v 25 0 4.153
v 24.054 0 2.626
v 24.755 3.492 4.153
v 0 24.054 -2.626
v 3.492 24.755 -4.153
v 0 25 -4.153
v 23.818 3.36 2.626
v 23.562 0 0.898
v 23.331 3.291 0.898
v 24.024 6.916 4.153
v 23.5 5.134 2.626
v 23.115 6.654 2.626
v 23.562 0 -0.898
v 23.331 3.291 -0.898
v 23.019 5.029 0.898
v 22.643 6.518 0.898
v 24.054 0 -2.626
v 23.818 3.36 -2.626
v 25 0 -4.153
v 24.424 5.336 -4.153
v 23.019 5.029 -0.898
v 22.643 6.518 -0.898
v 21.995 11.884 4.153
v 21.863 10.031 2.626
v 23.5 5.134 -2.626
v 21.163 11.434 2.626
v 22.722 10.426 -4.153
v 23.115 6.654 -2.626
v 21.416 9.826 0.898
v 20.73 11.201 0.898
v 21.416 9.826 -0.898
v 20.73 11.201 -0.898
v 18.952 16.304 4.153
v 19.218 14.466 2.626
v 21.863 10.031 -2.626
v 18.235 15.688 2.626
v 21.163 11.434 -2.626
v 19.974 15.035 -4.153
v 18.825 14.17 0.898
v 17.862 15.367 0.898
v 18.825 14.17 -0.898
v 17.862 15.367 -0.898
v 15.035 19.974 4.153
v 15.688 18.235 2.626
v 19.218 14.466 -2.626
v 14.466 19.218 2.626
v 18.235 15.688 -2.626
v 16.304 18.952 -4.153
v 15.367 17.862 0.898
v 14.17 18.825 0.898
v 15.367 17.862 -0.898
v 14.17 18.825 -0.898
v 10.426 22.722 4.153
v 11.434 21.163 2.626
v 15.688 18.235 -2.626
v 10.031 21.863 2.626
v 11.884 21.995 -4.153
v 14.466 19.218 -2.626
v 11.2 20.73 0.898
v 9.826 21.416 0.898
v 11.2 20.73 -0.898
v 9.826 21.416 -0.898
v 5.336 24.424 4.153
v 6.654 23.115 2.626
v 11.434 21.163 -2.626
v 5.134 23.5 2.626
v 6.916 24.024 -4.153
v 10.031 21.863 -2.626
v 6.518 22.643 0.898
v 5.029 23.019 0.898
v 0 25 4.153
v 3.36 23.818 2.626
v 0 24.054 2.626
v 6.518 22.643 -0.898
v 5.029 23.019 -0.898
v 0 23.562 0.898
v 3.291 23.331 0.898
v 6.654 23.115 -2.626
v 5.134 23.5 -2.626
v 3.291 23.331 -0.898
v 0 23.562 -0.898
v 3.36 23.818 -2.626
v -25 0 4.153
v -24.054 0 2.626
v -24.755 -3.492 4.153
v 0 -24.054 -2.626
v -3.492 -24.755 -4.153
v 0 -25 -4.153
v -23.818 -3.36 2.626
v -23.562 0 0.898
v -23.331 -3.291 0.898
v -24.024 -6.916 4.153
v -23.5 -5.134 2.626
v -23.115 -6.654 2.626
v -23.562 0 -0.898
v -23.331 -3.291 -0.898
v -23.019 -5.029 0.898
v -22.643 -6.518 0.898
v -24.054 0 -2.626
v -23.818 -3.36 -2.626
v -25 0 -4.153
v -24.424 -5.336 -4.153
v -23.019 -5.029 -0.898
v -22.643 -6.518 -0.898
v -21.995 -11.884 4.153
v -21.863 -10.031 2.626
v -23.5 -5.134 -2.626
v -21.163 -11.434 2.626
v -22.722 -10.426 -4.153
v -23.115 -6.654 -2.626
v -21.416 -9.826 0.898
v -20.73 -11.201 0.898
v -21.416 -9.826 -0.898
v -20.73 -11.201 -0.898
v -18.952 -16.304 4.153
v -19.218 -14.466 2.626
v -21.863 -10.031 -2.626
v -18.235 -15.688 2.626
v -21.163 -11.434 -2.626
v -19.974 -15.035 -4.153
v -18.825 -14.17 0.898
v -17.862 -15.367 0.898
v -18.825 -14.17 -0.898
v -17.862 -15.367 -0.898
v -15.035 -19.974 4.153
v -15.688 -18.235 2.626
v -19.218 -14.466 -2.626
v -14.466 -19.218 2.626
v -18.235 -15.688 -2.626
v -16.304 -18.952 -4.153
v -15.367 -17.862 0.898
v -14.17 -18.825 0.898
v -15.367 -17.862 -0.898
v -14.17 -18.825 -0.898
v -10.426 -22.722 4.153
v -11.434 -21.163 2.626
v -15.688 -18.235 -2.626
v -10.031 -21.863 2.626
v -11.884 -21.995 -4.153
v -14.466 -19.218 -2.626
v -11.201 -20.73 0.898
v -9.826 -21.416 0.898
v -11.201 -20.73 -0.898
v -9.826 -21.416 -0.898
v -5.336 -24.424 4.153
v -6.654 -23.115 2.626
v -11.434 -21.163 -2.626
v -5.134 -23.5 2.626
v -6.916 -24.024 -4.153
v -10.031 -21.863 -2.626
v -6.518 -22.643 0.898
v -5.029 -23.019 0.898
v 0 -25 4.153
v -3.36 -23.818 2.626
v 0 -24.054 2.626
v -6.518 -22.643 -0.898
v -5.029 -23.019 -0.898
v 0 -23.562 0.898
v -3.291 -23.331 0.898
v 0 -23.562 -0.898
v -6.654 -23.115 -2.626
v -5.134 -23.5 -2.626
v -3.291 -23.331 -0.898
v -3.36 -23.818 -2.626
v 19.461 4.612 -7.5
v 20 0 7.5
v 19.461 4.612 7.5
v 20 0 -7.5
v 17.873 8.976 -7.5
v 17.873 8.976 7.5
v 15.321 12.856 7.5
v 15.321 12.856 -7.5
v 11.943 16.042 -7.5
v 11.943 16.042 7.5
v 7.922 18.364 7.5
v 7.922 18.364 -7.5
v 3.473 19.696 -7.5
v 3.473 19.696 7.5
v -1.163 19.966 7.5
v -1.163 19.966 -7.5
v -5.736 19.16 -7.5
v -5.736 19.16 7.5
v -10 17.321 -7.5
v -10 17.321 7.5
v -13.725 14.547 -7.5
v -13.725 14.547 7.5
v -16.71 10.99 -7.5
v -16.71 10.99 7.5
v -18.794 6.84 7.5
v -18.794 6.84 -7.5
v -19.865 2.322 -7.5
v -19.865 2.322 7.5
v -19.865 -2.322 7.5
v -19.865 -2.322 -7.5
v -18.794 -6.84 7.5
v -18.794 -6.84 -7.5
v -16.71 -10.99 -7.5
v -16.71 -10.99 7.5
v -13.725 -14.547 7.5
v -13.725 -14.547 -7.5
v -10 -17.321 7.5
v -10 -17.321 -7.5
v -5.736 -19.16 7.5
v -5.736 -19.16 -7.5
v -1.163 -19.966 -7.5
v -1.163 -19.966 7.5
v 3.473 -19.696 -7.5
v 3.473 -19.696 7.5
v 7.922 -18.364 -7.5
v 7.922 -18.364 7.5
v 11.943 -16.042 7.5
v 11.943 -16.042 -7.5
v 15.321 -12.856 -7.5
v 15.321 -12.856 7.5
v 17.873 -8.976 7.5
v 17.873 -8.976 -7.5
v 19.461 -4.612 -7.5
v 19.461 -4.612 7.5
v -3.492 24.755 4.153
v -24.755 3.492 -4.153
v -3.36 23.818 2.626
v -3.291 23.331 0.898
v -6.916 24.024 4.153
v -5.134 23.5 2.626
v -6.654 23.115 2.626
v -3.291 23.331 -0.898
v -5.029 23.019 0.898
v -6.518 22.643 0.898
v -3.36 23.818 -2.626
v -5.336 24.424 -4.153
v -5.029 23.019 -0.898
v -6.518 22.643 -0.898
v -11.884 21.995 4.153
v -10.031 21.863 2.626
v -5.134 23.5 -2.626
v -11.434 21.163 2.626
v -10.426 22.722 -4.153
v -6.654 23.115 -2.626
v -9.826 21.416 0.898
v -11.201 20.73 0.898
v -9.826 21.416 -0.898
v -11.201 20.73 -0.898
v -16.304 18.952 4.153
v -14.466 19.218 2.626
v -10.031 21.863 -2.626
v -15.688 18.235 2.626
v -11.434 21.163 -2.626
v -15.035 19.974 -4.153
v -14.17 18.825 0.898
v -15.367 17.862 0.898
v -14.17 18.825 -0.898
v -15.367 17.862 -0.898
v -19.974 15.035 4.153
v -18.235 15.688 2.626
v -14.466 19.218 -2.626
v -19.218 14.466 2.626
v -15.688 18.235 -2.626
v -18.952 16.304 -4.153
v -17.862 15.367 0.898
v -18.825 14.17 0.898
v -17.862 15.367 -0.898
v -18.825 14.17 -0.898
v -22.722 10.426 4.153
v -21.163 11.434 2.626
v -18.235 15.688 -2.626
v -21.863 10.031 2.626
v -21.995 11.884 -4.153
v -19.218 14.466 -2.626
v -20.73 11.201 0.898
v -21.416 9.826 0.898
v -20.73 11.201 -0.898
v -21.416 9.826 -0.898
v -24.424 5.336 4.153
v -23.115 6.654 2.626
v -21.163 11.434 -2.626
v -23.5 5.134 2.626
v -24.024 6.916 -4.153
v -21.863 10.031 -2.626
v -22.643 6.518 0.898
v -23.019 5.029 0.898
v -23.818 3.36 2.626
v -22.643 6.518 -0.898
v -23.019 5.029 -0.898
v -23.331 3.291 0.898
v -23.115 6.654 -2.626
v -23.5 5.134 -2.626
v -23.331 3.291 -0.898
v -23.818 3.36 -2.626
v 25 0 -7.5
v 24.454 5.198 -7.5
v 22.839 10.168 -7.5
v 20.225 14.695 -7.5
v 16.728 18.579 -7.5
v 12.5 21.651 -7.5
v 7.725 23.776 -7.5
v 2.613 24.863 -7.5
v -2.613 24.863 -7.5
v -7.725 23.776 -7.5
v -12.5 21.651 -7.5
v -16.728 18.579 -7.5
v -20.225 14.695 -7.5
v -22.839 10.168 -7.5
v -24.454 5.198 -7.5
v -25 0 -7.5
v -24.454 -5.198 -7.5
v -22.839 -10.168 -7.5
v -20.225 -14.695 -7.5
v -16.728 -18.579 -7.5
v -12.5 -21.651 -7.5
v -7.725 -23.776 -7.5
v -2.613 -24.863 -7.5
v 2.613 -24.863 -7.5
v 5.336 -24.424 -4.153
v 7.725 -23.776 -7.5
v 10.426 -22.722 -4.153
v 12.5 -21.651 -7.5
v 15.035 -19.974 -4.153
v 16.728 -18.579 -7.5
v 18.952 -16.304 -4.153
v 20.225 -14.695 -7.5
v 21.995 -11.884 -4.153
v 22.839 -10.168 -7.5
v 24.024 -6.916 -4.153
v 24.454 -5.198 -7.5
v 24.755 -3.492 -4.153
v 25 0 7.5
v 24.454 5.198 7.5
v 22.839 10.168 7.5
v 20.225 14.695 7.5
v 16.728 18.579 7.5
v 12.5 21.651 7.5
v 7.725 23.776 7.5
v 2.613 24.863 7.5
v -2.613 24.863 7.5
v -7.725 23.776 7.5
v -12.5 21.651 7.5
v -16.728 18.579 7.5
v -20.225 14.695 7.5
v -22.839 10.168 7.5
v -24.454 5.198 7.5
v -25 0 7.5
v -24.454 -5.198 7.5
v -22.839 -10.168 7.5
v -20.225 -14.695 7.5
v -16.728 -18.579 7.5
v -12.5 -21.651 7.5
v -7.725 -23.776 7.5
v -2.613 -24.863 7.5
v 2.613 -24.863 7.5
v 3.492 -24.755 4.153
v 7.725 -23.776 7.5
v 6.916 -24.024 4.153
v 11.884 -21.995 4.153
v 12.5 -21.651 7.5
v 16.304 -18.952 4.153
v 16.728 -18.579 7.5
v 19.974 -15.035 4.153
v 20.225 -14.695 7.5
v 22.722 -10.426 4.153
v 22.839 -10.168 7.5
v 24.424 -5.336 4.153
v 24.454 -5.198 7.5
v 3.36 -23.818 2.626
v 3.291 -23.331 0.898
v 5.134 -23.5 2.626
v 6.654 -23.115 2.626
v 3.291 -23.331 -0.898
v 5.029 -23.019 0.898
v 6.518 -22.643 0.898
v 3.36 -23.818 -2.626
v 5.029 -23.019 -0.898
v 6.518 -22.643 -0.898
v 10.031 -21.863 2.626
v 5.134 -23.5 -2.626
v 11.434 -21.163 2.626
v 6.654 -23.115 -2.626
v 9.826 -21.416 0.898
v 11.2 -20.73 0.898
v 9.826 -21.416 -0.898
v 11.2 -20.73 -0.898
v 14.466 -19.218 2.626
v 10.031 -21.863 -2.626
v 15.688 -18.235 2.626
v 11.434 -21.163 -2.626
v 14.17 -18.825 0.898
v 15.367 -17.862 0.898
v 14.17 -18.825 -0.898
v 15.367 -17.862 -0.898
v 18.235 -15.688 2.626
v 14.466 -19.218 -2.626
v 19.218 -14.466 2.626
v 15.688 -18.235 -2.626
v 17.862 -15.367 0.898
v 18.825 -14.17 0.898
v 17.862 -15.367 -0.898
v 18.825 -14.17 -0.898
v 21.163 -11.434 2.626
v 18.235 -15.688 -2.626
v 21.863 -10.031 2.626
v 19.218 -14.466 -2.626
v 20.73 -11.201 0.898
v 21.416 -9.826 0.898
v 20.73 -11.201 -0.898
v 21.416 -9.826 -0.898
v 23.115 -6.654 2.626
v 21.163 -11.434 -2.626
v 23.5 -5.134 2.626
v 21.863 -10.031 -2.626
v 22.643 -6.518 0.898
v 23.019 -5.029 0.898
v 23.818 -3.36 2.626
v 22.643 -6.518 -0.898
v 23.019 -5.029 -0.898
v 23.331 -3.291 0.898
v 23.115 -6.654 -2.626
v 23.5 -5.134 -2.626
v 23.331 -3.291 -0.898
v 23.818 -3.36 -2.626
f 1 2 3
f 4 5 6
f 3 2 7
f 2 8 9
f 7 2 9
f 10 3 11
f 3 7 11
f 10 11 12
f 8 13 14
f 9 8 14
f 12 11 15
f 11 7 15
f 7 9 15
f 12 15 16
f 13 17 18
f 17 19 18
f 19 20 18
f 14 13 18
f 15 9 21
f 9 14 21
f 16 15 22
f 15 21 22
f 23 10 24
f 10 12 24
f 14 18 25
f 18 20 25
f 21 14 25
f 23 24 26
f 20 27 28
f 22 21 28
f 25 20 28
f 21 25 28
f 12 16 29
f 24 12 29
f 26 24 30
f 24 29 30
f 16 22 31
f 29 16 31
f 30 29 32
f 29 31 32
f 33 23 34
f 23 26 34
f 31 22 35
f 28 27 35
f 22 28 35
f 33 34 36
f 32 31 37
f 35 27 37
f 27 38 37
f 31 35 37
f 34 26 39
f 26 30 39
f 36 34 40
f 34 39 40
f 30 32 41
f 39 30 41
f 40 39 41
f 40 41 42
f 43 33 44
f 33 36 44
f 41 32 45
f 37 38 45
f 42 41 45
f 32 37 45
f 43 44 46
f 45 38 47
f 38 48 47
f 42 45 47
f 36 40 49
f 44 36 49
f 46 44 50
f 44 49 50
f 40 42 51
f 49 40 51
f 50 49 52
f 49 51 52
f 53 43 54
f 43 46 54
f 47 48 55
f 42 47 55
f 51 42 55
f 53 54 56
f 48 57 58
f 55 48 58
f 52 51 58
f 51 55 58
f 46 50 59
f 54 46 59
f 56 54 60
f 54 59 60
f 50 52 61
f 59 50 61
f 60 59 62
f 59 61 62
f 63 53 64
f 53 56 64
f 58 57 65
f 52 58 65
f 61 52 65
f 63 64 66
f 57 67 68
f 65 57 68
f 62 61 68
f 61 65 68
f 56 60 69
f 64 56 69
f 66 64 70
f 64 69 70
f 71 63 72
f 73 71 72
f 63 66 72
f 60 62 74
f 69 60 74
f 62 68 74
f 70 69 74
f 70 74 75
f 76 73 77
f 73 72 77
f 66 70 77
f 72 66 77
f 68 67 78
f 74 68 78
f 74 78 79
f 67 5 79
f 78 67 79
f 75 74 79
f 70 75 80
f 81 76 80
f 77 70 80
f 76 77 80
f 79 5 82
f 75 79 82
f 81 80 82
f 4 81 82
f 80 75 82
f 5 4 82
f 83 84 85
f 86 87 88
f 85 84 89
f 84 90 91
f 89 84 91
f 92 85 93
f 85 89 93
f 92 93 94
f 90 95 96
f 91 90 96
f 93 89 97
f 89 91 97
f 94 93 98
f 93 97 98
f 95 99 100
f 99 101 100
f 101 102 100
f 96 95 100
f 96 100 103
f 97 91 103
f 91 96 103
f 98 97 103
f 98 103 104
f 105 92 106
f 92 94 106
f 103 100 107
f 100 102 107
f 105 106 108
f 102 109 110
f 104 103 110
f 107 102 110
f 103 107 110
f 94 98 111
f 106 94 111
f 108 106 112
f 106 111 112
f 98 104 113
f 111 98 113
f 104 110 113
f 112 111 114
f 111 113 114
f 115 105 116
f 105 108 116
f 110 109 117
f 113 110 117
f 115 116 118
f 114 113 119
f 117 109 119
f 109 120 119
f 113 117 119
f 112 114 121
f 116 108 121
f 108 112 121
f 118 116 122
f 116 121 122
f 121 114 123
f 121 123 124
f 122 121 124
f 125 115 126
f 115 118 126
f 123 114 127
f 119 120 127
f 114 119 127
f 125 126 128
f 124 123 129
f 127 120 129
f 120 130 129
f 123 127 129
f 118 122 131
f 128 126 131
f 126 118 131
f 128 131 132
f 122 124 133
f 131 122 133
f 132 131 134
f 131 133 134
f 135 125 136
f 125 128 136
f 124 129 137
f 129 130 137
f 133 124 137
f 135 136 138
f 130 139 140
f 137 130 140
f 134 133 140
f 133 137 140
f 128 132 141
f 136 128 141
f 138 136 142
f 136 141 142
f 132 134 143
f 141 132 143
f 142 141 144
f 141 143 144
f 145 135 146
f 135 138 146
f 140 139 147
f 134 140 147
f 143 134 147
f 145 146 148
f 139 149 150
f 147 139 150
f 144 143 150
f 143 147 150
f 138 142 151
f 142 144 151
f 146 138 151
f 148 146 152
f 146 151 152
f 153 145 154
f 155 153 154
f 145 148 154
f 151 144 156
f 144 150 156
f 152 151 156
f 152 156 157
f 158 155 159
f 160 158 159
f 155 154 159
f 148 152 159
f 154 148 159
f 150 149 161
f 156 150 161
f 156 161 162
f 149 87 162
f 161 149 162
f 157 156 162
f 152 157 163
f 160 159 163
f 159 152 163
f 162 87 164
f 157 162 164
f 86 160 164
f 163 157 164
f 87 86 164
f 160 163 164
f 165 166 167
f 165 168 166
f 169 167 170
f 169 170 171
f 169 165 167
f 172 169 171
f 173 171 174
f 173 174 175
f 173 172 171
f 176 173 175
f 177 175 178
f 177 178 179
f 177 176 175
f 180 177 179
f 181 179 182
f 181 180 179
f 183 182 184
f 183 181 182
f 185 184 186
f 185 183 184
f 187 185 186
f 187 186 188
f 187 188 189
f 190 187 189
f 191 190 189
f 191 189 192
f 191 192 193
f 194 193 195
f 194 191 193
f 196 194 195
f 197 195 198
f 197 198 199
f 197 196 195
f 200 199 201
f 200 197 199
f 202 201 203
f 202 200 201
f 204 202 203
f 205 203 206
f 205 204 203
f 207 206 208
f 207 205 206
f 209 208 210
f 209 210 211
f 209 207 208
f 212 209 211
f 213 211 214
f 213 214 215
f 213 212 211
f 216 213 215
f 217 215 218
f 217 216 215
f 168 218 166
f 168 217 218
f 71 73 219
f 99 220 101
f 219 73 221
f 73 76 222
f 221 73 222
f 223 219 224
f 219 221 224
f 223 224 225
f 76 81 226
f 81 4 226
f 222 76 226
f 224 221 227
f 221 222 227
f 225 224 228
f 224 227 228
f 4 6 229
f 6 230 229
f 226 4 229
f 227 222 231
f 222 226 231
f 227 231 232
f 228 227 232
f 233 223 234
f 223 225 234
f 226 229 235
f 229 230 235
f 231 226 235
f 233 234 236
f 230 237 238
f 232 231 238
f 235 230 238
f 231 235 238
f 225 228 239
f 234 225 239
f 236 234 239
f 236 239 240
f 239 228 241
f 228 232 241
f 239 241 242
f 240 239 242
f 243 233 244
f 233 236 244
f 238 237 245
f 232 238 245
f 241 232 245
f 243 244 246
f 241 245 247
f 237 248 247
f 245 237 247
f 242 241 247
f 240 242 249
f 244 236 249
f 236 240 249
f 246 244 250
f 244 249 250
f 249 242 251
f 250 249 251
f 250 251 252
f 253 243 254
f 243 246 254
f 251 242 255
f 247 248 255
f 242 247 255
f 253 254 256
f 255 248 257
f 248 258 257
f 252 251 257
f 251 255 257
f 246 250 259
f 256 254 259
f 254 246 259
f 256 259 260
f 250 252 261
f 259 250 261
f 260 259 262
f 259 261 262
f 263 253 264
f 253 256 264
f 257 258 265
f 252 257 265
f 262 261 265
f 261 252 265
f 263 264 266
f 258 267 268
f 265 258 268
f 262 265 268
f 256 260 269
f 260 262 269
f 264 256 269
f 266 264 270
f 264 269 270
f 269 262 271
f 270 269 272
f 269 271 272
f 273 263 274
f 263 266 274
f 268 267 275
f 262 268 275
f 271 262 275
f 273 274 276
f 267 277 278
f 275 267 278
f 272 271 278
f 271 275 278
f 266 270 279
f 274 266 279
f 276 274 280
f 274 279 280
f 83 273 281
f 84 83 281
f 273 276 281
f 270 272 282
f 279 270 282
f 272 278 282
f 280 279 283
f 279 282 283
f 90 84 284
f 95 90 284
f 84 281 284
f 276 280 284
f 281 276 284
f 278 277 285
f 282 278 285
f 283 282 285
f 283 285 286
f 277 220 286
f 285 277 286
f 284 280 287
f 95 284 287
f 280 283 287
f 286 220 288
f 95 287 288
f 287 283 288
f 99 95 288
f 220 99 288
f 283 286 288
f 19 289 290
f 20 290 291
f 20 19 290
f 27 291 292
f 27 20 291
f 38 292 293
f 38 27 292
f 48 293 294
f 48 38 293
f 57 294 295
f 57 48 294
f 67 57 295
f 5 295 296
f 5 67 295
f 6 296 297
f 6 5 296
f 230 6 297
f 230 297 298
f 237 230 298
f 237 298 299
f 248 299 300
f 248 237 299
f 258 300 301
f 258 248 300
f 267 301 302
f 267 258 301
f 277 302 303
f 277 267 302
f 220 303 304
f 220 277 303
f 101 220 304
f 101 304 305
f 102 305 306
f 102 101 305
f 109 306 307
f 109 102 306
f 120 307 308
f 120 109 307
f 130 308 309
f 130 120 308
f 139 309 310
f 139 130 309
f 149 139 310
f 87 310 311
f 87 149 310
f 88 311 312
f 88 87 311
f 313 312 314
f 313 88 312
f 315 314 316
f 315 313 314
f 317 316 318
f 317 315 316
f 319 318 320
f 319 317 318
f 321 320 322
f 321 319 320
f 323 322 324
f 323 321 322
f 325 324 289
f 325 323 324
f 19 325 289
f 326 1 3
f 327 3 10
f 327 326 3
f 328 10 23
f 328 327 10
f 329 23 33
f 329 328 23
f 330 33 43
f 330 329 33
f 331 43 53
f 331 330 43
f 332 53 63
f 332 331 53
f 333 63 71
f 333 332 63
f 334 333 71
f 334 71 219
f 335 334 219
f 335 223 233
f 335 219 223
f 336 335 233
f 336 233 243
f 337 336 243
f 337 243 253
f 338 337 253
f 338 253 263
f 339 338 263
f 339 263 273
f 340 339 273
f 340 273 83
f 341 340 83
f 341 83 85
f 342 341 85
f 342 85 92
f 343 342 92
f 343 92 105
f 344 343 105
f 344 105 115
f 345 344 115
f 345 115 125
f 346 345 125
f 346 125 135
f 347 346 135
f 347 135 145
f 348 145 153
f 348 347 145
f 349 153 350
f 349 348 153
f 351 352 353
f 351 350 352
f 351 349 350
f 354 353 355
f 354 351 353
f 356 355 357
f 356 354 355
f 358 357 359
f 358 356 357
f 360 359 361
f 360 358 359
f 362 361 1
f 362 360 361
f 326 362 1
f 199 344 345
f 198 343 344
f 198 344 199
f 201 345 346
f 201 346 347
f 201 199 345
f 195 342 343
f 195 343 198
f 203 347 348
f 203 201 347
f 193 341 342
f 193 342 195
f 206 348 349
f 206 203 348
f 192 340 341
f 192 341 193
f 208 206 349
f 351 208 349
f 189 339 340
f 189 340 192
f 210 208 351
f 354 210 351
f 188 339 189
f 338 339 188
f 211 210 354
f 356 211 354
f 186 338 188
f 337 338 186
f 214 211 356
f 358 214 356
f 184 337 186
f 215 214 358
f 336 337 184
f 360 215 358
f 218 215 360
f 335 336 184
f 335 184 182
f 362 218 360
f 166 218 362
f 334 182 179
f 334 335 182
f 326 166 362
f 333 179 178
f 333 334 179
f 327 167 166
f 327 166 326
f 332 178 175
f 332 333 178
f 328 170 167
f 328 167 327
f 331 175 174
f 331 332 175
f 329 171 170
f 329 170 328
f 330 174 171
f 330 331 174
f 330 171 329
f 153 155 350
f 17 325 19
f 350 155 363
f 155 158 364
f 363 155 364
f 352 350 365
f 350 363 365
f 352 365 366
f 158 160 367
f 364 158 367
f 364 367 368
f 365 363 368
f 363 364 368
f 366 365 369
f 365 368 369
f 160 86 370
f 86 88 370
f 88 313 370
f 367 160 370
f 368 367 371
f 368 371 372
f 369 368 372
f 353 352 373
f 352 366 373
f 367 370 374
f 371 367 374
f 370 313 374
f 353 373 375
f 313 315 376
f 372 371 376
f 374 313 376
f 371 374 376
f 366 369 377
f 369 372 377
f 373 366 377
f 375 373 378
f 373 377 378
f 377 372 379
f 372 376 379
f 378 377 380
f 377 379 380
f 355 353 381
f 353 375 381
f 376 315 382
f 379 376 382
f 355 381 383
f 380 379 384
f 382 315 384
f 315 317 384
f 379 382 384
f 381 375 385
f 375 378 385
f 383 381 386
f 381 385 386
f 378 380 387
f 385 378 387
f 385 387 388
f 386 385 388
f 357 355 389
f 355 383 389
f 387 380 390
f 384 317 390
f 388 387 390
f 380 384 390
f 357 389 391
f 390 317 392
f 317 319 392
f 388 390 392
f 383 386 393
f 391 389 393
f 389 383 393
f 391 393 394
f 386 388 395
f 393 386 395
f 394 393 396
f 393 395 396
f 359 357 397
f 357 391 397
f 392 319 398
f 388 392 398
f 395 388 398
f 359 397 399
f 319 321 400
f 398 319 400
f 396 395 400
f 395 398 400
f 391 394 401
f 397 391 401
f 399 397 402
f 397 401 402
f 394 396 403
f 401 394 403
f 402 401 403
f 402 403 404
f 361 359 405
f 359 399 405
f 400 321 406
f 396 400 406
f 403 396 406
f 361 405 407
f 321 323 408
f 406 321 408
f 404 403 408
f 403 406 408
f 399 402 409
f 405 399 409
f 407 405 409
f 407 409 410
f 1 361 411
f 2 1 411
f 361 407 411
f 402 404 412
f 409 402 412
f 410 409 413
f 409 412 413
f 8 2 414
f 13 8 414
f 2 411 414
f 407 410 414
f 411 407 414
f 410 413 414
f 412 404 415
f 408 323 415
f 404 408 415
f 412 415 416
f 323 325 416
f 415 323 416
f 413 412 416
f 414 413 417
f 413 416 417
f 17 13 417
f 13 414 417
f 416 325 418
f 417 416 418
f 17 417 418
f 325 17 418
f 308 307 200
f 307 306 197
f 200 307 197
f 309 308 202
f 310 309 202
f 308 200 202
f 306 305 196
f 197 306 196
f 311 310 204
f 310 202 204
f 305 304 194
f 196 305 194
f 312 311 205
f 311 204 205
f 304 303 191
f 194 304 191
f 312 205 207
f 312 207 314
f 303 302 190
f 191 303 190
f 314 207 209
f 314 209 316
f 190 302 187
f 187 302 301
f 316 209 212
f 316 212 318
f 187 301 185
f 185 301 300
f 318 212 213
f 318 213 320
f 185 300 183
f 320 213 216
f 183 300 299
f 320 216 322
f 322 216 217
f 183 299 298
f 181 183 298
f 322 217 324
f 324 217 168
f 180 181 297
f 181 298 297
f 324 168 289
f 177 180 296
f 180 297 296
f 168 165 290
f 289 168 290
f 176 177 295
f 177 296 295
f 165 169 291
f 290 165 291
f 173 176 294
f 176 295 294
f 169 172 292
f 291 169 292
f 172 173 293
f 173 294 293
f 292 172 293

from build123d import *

# Parameters (mm, degrees)
SKETCH1_R           = 25
SKETCH1_R_2         = 20
BOSS_EXTRUDE1_DEPTH = 7.5
SKETCH4_R           = 6.5


with BuildPart() as part:
    # Sketch1 → Boss-Extrude1 (new, symmetric)
    with BuildSketch(Plane.XY):
        Circle(SKETCH1_R)
        Circle(SKETCH1_R_2, mode=Mode.SUBTRACT)
    extrude(amount=BOSS_EXTRUDE1_DEPTH, both=True)

    # Cut-Sweep2: sweep along a curve in space
    with BuildLine() as cut_sweep2_path:
        ThreePointArc((25, 0, 7.5), (17.67766953, 17.67766953, 7.5), (0, 25, 7.5))
        ThreePointArc((0, 25, 7.5), (-17.67766953, 17.67766953, 7.5), (-25, 0, 7.5))
        ThreePointArc((-25, 0, 7.5), (-17.67766953, -17.67766953, 7.5), (0, -25, 7.5))
        ThreePointArc((0, -25, 7.5), (17.67766953, -17.67766953, 7.5), (25, 0, 7.5))
    # Sketch4 → Cut-Sweep2 (sweep, cut)
    with BuildSketch(Plane(origin=(0, 0, 0), x_dir=(0, 0, -1), z_dir=(1, 0, 0))):
        with Locations((0, -30)):
            Circle(SKETCH4_R)
    sweep(path=cut_sweep2_path.line, mode=Mode.SUBTRACT)


solid = part.part
